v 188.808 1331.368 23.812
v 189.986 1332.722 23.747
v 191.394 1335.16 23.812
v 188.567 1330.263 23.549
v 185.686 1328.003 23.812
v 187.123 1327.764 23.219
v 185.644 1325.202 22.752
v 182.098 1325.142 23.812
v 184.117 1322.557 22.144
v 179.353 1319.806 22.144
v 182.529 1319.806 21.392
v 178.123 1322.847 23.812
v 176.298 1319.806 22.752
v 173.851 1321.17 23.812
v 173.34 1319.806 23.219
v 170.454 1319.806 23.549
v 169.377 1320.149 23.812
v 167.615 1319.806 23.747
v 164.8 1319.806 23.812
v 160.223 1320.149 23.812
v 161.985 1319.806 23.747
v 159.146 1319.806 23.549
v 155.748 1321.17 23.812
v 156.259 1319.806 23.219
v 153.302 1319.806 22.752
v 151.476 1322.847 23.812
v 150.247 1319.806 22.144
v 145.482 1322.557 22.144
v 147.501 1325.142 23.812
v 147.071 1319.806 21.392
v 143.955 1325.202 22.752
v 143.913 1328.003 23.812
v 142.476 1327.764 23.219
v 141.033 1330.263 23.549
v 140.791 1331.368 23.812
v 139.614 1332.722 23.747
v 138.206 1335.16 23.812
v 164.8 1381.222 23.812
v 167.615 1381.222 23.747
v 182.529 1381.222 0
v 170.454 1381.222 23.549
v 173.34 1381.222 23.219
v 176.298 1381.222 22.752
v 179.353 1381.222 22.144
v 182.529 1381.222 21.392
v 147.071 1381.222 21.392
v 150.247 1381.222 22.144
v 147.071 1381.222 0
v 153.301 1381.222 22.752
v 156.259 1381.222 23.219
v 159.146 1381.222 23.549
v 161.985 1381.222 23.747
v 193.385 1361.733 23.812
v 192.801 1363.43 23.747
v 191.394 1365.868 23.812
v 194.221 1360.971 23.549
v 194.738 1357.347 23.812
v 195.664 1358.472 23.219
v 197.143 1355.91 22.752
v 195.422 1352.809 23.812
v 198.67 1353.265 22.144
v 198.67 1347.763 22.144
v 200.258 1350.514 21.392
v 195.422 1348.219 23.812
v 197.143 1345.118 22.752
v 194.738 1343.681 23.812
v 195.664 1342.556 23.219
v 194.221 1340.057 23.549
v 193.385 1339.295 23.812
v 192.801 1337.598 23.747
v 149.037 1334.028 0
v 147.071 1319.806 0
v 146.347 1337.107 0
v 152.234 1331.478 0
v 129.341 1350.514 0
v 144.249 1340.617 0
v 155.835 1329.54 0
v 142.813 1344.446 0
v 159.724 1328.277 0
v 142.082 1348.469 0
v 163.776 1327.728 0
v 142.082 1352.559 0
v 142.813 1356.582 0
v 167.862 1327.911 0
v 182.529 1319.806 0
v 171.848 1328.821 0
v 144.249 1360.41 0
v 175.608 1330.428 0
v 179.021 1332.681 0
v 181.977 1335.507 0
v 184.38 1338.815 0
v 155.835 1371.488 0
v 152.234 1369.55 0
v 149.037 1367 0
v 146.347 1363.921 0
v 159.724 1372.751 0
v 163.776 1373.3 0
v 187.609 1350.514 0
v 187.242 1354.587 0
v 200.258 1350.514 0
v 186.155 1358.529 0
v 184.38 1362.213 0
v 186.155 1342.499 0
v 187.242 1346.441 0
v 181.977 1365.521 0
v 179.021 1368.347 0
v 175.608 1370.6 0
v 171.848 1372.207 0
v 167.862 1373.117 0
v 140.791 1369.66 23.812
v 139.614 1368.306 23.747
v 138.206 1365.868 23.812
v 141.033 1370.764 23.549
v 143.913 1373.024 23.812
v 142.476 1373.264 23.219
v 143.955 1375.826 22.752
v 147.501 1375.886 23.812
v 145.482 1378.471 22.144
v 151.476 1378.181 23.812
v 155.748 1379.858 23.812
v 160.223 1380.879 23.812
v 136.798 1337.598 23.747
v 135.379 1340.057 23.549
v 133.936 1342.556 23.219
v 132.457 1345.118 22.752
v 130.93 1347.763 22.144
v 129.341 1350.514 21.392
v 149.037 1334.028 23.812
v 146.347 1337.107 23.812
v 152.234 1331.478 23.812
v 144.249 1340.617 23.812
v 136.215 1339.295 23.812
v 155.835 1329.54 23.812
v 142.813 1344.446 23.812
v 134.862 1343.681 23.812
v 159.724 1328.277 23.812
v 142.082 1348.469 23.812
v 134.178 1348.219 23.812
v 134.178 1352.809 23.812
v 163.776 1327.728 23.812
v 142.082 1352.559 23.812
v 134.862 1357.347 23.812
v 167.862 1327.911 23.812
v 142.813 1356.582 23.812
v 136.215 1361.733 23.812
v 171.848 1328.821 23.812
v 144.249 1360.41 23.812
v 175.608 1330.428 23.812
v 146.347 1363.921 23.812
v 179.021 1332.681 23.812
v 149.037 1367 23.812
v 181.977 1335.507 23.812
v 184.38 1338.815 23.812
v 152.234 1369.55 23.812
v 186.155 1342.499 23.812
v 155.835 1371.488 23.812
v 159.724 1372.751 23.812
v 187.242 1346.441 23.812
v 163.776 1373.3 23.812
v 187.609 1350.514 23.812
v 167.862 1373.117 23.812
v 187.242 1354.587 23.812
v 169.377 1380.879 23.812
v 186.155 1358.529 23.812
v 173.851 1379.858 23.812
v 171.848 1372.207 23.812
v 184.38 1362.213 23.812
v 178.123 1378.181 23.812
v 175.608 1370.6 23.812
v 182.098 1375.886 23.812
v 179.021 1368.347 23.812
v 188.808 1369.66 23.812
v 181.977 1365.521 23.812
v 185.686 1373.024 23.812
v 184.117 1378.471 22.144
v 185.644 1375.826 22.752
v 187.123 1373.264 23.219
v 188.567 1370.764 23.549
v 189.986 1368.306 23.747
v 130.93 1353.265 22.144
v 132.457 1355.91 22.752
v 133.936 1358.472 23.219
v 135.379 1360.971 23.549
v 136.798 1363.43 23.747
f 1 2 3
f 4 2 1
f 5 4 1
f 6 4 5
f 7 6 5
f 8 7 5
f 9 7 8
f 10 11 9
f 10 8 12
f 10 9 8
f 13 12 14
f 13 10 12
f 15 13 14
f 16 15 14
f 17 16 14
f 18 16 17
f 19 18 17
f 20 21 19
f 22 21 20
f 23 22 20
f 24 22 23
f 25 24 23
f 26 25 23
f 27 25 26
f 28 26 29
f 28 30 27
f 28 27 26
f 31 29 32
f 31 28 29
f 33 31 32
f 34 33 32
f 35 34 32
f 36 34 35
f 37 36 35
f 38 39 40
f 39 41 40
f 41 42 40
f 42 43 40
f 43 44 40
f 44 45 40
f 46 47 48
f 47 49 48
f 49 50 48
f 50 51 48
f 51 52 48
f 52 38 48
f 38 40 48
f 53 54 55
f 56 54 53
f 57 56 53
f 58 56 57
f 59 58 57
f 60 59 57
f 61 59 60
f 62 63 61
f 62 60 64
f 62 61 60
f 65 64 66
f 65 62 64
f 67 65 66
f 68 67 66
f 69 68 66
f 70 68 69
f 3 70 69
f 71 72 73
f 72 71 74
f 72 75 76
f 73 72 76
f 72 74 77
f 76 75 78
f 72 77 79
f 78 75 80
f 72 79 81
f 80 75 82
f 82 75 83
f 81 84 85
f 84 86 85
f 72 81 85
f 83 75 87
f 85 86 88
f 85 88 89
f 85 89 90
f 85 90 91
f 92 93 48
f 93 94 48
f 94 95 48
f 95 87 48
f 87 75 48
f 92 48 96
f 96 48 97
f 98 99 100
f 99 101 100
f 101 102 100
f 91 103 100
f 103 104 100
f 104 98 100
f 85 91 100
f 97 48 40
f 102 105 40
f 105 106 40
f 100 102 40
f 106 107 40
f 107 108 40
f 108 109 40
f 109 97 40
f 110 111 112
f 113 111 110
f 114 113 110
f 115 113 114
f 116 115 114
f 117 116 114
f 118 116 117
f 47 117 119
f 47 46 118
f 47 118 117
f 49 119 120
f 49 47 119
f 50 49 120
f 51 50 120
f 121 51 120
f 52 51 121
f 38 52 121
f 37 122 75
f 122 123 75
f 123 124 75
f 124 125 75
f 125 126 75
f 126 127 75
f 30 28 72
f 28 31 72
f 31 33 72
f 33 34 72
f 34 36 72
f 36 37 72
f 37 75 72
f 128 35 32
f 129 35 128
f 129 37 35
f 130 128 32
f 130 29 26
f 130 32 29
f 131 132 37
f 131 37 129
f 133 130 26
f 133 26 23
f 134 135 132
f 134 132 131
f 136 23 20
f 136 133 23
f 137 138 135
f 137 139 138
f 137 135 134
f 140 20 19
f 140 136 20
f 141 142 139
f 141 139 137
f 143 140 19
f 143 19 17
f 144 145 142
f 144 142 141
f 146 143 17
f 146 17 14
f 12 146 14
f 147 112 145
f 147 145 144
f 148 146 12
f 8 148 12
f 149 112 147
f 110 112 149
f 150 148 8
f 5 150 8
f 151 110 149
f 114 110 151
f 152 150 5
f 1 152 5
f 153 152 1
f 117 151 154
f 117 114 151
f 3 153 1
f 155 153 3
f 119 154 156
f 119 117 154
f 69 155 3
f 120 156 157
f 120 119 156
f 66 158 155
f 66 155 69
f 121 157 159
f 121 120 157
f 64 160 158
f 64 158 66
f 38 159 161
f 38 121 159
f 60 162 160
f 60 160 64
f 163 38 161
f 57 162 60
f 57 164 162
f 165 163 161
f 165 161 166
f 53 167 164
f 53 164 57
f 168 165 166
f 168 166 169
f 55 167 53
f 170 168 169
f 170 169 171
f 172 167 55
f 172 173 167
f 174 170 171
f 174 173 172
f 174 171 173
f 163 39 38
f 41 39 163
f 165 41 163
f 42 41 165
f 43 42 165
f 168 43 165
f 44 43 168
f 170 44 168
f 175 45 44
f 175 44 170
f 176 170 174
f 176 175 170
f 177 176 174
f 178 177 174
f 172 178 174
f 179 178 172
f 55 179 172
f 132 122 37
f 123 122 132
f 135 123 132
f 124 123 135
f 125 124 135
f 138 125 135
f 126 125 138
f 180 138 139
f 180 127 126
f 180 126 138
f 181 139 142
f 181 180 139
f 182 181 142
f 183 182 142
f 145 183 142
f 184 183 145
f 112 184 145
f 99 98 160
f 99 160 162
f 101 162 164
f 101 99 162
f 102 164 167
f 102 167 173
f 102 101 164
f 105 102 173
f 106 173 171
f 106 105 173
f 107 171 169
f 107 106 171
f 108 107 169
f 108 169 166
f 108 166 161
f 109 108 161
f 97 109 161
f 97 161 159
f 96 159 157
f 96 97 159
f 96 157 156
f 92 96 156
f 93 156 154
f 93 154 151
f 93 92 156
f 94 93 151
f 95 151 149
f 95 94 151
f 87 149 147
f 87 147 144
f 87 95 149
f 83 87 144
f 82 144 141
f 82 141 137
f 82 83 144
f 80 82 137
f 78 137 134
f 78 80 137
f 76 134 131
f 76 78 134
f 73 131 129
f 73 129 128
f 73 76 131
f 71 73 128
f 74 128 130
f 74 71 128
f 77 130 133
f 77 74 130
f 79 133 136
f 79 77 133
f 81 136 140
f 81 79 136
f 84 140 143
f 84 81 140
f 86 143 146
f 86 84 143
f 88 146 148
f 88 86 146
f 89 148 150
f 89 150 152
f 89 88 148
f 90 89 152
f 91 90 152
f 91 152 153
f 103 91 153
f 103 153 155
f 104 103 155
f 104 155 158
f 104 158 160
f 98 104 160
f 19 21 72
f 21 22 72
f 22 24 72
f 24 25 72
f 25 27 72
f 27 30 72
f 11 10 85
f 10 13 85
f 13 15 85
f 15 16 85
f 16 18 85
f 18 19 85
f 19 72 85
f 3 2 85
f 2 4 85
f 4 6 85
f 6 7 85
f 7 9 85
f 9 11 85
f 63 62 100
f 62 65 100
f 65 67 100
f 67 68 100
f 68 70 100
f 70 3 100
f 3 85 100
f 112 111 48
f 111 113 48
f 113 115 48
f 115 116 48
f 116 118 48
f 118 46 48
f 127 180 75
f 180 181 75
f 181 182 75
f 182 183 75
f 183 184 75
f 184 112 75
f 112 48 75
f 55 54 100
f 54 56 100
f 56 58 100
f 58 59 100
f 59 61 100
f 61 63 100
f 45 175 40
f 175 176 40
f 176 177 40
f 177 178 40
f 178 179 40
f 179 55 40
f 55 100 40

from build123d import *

# Parameters (mm, degrees)
SKETCH1_R           = 22.8092
BOSS_EXTRUDE1_DEPTH = 23.8125
SKETCH2_OUTSIDE_W   = 102.245
SKETCH2_OUTSIDE_H   = 92.744
SKETCH2_OUTSIDE_R   = 30.707875178
CUT_EXTRUDE1_DEPTH  = 2.54
CUT_EXTRUDE1_TAPER  = 63


with BuildPart() as part:
    # Sketch1 → Boss-Extrude1 (new body)
    with BuildSketch(Plane.XY):
        Polygon((129.341403954, 1350.513952992), (147.070603954, 1319.806077815), (182.529003954, 1319.806077815), (200.258203954, 1350.513952992), (182.529003954, 1381.22182817), (147.070603954, 1381.22182817), align=None)
        with Locations((164.799803954, 1350.513952992)):
            Circle(SKETCH1_R, mode=Mode.SUBTRACT)
    extrude(amount=BOSS_EXTRUDE1_DEPTH)

    # Sketch2 outside → Cut-Extrude1 (cut)
    with BuildSketch(Plane.XY.offset(23.8125)):
        with Locations((164.7995, 1350.514)):
            Rectangle(SKETCH2_OUTSIDE_W, SKETCH2_OUTSIDE_H)
        with Locations((164.799803954, 1350.513952992)):
            Circle(SKETCH2_OUTSIDE_R, mode=Mode.SUBTRACT)
    extrude(amount=-CUT_EXTRUDE1_DEPTH, taper=CUT_EXTRUDE1_TAPER, mode=Mode.SUBTRACT)


solid = part.part
